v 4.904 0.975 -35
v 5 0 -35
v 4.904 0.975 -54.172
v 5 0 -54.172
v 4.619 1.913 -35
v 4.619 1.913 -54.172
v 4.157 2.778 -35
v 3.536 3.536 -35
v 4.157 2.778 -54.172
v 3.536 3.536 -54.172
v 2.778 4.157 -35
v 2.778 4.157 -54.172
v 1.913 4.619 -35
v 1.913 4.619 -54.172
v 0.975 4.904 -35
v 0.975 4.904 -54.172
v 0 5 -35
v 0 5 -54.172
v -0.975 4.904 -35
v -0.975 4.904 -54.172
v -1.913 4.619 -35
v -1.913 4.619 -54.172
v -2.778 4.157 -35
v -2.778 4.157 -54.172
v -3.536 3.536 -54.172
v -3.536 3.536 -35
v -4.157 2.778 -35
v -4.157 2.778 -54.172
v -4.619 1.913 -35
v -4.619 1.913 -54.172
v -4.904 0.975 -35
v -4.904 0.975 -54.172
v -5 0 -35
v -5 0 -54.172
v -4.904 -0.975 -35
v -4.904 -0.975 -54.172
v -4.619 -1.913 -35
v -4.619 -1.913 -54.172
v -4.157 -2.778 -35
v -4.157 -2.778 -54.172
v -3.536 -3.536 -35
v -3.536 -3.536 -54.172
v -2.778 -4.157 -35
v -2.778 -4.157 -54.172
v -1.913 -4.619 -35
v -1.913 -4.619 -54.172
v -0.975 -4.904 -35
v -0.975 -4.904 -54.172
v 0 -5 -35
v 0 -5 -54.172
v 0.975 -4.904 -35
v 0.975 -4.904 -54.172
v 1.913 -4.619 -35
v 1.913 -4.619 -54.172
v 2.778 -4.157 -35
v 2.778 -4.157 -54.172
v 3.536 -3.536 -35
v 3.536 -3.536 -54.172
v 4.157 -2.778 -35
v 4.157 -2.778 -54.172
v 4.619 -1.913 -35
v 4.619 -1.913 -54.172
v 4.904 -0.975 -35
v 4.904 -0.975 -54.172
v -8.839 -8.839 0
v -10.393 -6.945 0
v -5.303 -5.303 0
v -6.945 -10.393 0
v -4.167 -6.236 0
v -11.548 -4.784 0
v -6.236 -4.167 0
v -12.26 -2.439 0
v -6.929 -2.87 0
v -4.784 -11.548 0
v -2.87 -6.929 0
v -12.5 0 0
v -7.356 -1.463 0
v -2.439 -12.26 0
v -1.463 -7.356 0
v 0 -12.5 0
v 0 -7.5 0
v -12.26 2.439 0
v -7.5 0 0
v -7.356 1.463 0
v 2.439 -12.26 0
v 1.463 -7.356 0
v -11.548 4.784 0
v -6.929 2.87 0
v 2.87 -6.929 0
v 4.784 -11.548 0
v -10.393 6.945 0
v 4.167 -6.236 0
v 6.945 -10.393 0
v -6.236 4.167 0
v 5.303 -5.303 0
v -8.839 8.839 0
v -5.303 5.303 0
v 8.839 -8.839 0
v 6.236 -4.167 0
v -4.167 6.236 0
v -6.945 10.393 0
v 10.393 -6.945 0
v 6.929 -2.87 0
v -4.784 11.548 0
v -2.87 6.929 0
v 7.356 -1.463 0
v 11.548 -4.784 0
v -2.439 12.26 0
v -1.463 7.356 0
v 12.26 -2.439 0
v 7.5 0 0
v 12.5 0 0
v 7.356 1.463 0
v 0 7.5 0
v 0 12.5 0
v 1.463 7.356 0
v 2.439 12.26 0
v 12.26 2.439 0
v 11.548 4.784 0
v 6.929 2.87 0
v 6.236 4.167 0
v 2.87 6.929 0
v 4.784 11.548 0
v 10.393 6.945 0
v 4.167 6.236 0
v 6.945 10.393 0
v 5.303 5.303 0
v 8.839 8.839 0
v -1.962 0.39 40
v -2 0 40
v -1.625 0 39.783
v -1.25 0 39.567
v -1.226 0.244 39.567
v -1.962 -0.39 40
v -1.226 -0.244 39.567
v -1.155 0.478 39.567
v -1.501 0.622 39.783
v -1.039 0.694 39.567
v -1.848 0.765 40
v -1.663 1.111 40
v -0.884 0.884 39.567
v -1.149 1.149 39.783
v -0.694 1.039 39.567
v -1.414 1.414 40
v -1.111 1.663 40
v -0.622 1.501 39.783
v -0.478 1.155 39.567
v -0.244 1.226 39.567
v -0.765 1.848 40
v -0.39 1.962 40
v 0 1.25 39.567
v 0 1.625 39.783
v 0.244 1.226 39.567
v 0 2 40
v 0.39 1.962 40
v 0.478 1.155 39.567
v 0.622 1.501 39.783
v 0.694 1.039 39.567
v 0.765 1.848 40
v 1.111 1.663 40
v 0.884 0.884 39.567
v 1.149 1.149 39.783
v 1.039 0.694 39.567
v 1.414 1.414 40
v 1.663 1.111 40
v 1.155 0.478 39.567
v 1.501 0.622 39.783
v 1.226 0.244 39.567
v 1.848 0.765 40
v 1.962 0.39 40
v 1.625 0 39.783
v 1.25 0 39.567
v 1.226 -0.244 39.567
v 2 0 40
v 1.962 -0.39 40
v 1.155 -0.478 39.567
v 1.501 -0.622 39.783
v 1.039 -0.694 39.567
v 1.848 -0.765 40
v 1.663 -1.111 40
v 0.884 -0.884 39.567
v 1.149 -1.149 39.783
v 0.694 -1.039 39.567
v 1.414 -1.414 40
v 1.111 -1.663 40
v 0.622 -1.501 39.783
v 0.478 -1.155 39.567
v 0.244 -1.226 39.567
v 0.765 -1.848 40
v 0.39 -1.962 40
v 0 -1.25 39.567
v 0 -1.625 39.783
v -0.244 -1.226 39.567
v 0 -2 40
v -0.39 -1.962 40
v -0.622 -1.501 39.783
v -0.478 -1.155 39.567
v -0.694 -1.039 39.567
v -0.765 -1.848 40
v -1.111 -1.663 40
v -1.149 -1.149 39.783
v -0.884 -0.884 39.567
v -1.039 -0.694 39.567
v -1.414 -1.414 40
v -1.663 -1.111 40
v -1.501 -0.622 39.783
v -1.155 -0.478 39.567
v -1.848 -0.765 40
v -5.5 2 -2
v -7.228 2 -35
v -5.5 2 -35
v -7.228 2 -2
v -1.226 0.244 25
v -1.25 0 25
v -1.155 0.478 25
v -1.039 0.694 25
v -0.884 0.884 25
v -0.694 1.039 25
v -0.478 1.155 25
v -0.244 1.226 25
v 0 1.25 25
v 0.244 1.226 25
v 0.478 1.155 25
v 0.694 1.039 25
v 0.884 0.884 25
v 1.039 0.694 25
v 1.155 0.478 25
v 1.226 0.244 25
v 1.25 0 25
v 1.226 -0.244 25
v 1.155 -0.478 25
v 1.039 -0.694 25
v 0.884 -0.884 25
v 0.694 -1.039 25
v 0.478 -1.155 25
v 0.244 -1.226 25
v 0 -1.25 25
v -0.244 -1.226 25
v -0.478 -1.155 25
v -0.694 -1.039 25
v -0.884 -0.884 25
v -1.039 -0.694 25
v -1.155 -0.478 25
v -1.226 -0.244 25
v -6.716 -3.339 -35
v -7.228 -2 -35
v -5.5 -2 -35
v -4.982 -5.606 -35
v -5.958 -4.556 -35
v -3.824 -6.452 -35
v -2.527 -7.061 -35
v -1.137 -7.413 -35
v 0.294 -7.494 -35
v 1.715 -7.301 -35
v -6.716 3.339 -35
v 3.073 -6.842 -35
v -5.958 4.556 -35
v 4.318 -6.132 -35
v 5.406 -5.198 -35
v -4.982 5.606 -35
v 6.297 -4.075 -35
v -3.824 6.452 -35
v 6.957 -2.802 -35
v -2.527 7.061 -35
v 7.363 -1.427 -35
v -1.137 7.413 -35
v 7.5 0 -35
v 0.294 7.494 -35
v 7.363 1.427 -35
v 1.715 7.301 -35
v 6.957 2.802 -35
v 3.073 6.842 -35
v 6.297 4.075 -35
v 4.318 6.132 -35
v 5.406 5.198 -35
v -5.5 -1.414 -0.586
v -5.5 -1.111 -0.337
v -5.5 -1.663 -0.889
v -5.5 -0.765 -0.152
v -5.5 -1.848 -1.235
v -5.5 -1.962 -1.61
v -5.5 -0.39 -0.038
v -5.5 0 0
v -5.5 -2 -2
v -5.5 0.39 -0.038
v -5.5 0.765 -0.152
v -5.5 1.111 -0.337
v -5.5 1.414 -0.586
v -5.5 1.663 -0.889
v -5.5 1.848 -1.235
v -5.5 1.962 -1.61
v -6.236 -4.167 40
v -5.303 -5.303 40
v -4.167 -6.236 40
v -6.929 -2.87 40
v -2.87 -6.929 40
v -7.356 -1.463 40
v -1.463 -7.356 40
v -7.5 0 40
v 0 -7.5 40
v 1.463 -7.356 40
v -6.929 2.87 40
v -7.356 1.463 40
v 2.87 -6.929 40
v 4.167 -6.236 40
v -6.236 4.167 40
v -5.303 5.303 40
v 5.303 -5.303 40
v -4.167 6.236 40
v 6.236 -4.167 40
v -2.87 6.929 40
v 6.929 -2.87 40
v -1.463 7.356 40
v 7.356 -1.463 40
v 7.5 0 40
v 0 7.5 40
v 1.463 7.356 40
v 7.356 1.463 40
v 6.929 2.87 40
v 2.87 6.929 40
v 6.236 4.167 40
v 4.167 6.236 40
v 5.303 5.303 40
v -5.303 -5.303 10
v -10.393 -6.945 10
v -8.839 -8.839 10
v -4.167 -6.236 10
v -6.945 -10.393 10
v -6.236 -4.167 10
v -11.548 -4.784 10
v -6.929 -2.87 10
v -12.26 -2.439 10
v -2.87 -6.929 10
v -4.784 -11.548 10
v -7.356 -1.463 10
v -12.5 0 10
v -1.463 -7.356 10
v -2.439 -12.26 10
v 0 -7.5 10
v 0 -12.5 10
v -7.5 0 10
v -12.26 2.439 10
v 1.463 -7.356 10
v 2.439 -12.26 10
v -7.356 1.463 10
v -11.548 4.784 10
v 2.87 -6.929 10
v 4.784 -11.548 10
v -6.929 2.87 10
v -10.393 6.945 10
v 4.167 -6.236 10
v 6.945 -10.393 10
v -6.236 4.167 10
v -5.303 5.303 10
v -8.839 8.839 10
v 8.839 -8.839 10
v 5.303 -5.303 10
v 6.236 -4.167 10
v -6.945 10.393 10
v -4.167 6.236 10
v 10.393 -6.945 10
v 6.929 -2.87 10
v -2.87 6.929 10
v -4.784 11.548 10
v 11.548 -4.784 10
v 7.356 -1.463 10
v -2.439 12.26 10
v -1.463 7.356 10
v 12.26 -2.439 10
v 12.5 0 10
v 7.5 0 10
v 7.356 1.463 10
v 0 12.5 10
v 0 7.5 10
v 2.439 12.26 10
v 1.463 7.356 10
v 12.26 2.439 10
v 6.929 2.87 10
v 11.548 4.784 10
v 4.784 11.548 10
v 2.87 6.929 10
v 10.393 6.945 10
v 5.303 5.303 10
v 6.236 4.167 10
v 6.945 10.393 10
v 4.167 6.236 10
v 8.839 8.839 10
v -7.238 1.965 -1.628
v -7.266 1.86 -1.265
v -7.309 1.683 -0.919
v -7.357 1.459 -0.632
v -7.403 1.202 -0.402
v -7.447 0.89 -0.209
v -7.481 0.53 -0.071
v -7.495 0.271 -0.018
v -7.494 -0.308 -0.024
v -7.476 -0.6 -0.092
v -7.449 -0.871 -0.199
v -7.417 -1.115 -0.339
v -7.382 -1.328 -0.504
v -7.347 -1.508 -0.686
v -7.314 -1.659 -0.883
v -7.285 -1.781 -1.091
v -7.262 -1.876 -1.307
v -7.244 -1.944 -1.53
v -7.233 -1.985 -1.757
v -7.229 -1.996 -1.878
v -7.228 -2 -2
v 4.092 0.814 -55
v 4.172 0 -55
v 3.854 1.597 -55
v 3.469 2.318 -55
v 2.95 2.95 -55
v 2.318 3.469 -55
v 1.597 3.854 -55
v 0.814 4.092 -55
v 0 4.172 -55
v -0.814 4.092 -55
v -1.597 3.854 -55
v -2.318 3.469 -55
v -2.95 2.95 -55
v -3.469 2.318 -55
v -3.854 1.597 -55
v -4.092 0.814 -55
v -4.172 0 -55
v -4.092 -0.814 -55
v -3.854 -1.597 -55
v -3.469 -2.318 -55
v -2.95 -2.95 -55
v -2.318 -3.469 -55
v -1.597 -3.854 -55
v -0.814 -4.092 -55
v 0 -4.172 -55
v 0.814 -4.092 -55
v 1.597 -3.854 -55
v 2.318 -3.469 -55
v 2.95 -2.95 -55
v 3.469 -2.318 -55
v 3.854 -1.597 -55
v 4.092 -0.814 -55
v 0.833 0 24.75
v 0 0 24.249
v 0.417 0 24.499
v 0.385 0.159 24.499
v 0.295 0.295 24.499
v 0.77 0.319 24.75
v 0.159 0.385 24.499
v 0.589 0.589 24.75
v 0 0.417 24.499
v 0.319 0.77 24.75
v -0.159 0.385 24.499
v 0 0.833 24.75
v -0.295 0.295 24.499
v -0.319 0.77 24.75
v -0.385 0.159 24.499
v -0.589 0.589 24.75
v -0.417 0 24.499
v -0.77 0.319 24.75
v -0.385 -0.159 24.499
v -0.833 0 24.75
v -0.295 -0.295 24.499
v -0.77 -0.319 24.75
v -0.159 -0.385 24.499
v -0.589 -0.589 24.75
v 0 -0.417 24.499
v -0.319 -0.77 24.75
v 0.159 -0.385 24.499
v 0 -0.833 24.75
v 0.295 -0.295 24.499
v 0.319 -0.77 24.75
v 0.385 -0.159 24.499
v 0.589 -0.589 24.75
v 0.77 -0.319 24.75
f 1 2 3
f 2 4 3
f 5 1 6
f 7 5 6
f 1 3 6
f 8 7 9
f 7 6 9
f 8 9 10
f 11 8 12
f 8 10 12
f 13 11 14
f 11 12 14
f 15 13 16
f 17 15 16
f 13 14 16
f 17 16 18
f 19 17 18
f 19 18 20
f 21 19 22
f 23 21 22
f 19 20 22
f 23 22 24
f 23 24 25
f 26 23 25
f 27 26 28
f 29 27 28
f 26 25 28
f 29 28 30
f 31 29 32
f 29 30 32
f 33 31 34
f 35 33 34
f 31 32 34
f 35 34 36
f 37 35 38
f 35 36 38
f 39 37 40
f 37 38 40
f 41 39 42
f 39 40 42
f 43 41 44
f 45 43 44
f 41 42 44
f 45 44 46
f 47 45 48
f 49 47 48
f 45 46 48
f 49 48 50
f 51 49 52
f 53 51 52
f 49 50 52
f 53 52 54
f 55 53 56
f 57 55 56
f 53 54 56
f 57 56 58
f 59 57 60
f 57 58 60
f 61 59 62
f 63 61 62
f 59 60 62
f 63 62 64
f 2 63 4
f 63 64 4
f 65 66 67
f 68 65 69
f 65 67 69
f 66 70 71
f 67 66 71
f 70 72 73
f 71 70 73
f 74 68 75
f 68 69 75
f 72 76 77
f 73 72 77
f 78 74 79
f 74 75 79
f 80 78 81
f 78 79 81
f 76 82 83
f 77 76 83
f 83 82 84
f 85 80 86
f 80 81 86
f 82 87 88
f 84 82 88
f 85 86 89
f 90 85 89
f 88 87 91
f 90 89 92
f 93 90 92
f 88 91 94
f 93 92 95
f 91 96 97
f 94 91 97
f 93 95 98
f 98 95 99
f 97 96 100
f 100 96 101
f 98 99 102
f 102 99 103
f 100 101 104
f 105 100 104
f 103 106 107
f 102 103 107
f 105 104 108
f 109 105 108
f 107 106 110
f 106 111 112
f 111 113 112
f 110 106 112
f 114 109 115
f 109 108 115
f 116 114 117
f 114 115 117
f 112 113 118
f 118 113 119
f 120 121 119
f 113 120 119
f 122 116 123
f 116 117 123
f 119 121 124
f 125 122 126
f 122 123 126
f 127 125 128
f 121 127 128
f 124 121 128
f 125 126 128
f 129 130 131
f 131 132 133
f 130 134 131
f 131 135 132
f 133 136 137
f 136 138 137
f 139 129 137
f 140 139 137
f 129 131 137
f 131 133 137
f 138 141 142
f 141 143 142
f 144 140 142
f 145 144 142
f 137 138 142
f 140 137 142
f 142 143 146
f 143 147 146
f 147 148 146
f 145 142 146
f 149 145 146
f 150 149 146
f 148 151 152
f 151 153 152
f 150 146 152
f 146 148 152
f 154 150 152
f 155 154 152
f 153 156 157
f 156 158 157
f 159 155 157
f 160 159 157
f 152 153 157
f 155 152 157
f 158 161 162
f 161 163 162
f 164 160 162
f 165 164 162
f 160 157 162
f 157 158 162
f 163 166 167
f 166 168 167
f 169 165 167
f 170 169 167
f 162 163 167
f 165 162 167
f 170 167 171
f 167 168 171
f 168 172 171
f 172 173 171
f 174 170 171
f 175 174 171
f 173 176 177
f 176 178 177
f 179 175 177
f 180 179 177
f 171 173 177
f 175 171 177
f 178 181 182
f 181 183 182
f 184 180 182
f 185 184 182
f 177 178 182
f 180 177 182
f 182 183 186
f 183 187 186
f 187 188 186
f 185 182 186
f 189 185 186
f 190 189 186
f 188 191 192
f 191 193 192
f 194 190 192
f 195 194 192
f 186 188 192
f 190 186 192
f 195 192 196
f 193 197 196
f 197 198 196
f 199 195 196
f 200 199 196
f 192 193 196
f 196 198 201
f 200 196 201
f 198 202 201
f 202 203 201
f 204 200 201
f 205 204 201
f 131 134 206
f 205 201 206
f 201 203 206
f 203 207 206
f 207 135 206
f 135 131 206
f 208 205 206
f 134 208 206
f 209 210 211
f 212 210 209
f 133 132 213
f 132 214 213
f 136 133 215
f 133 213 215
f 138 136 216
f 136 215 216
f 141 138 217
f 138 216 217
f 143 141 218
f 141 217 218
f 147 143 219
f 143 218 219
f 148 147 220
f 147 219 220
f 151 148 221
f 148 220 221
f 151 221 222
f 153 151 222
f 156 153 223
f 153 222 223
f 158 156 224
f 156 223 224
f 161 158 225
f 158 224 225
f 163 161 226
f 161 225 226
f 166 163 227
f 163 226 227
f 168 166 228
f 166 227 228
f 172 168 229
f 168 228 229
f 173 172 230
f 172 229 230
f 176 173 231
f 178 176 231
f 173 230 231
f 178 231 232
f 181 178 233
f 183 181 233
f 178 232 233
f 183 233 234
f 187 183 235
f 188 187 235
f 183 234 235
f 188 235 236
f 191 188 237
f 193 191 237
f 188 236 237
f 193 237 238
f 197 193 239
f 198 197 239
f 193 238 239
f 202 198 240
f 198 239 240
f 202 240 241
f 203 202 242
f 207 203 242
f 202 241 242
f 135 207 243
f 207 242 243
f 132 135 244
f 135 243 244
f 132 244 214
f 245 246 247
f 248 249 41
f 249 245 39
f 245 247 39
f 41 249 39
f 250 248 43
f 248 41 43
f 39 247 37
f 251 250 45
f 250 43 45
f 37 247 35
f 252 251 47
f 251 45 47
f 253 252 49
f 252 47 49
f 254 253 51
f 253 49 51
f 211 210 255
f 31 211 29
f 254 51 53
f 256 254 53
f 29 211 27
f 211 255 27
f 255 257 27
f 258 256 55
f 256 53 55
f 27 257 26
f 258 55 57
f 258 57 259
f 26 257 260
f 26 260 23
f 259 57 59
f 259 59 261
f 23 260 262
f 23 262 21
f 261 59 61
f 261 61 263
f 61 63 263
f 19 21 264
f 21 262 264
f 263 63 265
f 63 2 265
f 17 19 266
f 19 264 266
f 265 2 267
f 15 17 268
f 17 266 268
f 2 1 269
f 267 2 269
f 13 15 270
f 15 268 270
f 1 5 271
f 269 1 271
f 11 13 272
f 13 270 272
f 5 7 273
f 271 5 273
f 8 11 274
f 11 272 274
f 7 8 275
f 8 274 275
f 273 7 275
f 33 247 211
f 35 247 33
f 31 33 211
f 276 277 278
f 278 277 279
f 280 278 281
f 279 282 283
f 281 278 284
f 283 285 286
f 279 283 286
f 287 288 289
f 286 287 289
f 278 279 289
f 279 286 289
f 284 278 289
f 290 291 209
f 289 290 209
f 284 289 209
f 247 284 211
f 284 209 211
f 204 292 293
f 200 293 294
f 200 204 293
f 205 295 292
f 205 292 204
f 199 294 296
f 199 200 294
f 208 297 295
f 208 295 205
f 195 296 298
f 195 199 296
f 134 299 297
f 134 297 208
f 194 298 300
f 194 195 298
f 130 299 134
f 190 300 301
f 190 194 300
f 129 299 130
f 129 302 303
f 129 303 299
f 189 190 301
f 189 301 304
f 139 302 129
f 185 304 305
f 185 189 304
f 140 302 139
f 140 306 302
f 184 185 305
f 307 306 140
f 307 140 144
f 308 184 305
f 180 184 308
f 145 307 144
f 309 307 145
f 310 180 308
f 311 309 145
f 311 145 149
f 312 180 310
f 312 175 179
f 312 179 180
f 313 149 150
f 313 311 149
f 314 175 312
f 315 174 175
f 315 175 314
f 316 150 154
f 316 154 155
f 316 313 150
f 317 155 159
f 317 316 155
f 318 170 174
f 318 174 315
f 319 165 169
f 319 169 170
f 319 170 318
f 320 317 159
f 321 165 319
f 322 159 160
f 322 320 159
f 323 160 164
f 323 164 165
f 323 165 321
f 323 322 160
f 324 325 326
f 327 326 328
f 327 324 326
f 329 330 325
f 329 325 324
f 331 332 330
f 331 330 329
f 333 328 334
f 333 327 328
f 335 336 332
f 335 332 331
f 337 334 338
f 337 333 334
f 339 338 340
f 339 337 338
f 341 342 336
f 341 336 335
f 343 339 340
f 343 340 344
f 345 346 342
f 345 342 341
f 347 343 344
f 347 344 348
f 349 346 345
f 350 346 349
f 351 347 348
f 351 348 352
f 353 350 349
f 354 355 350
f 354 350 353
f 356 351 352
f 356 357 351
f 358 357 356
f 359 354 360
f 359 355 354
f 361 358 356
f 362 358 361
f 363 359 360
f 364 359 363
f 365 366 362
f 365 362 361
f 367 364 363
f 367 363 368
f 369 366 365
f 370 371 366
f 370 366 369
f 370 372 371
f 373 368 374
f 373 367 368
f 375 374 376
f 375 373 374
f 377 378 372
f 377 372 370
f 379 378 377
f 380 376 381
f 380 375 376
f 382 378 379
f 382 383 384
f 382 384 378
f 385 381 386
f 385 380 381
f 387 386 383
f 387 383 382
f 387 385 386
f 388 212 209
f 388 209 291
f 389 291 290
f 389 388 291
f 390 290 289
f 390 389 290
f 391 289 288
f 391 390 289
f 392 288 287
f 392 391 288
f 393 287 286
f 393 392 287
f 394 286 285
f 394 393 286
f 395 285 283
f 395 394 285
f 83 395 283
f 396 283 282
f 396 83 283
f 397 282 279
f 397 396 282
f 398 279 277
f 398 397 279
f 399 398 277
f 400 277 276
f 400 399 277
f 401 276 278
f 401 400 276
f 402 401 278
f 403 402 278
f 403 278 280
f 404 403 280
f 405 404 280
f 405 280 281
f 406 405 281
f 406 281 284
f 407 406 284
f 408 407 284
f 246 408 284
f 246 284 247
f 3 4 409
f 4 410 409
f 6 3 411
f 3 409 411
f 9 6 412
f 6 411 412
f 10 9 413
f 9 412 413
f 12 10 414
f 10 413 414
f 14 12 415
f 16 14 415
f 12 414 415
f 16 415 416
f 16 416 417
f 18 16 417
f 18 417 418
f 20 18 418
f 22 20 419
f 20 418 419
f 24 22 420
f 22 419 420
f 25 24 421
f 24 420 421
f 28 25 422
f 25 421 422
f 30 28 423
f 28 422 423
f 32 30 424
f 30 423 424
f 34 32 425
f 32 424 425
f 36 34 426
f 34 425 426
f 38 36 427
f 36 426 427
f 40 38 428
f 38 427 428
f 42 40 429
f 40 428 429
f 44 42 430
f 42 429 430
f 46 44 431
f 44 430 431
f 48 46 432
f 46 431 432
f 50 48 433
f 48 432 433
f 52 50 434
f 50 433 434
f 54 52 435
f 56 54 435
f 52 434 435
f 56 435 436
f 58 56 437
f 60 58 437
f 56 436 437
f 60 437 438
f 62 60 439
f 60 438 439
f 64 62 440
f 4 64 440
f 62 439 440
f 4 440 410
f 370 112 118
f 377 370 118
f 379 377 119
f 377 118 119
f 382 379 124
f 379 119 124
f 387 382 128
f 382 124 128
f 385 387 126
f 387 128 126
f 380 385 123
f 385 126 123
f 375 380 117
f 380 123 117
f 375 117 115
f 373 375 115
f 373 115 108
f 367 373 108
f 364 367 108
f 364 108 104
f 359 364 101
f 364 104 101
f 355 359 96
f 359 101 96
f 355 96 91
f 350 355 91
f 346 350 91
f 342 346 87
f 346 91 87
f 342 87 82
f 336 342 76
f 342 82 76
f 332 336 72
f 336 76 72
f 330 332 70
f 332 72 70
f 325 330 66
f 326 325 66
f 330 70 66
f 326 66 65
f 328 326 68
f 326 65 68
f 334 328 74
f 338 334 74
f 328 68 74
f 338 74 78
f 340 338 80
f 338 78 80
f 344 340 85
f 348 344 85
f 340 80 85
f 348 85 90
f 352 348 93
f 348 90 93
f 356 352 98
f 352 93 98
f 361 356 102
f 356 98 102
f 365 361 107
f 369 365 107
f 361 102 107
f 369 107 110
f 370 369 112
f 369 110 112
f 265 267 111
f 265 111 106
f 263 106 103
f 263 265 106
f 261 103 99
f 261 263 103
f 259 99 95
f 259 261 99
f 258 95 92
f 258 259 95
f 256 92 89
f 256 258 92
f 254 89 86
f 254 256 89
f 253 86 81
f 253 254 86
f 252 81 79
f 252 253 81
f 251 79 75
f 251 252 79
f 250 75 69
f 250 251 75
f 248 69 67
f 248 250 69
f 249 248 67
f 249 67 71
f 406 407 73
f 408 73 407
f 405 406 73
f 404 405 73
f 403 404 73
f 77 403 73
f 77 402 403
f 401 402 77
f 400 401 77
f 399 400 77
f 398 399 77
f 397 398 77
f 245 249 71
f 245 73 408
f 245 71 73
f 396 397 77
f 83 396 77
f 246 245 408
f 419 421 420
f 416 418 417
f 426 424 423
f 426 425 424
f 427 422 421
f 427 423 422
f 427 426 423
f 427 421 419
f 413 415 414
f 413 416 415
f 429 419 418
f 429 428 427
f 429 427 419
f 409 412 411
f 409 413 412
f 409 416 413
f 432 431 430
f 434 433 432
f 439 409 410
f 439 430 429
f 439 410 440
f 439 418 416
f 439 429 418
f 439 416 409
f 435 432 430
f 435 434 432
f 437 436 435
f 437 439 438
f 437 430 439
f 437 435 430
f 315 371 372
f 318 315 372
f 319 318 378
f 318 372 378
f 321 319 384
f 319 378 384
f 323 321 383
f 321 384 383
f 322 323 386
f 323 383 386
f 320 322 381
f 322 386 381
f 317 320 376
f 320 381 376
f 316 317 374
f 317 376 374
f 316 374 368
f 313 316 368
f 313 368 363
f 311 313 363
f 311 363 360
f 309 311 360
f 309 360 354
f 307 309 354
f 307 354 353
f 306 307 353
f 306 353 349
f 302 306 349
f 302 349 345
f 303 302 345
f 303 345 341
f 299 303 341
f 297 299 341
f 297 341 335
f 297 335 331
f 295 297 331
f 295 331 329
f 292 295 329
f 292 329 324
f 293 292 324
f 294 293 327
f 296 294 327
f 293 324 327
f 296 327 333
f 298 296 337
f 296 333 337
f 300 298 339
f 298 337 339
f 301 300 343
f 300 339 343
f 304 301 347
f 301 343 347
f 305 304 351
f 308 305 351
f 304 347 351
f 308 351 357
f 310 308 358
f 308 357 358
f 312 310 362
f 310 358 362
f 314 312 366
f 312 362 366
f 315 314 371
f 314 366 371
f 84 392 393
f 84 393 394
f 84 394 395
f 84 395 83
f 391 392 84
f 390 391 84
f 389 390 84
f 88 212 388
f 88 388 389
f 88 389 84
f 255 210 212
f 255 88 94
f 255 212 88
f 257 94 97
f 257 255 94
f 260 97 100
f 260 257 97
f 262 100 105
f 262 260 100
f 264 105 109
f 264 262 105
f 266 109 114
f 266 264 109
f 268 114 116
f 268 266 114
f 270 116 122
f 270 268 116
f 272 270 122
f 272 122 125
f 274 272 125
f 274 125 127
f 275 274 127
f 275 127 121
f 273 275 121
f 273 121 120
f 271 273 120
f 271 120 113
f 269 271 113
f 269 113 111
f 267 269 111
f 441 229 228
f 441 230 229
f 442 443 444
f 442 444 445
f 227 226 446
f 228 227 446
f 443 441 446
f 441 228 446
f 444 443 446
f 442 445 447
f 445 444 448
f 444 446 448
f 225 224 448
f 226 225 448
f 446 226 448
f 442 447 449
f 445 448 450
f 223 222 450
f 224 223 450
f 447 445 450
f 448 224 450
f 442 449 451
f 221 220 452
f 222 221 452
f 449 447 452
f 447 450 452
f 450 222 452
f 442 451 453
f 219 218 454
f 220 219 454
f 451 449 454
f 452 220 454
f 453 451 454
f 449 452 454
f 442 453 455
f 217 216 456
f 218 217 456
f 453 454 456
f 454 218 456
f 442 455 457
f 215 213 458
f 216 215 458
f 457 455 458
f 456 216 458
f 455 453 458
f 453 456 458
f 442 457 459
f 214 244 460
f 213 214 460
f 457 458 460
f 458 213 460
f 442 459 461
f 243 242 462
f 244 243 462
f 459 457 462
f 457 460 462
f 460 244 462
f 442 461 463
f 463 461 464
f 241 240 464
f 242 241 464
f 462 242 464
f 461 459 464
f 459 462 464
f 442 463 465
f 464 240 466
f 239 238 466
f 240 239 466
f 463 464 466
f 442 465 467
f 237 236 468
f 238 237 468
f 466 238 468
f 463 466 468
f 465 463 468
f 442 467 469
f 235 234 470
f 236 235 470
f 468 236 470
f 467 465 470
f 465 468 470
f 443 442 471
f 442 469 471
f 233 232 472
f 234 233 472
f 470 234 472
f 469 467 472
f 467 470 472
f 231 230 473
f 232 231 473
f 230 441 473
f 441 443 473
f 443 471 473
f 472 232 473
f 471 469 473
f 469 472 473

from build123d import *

# Parameters (mm, degrees)
SKETCH1_R                       = 12.5
F_25MM_DIA_DEPTH                = 10
F_15MM_START                    = -10
SKETCH2_R                       = 7.5
F_15MM_DIA_BEARING_END_DEPTH    = 40
F_15MM_START_2                  = 55
SKETCH3_R                       = 7.5
F_15MM_DIA_GEAR_END_DEPTH       = 55
M3X0_5_TAPPED_HOLE1_D           = 2.5
M3X0_5_TAPPED_HOLE1_DEPTH       = 15
M3X0_5_TAPPED_HOLE1_CSINK_D     = 4
M3X0_5_TAPPED_HOLE1_CSINK_ANGLE = 120
M3X0_5_TAPPED_HOLE1_TIP         = 0.751075774
CUT_EXTRUDE1_DEPTH              = 2


# Read off the part's stored shape, not the designer's step: M10x1.5 Machine Threads Stud1
with BuildPart() as part:
    # Sketch1 → 25mm dia (new body)
    with BuildSketch(Plane.XY):
        Circle(SKETCH1_R)
    extrude(amount=F_25MM_DIA_DEPTH)

    # Sketch2 → 15mm dia bearing end (add)
    with BuildSketch(Plane.XY.offset(10).offset(F_15MM_START)):
        Circle(SKETCH2_R)
    extrude(amount=F_15MM_DIA_BEARING_END_DEPTH)

    # Sketch3 → 15mm dia gear end (add)
    with BuildSketch(Plane(origin=(0, 0, 0), x_dir=(-1, 0, 0), z_dir=(0, 0, -1)).offset(F_15MM_START_2)):
        with Locations(Location((0, 0, 0), (0, 0, 180))):
            Circle(SKETCH3_R)
    extrude(amount=-F_15MM_DIA_GEAR_END_DEPTH)

    # M3x0.5 Tapped Hole1
    with Locations(Plane.XY.offset(40)):
        with Locations((0, 0)):
            CounterSinkHole(M3X0_5_TAPPED_HOLE1_D / 2, M3X0_5_TAPPED_HOLE1_CSINK_D / 2, depth=M3X0_5_TAPPED_HOLE1_DEPTH, counter_sink_angle=M3X0_5_TAPPED_HOLE1_CSINK_ANGLE)
            with Locations((0, 0, -(M3X0_5_TAPPED_HOLE1_DEPTH + M3X0_5_TAPPED_HOLE1_TIP / 2))):  # 118° drill point
                Cone(0, M3X0_5_TAPPED_HOLE1_D / 2, M3X0_5_TAPPED_HOLE1_TIP, mode=Mode.SUBTRACT)

    # M10x1.5 Machine Threads Stud1 outline → M10x1.5 Machine Threads Stud1 (revolve, cut)
    with BuildSketch(Plane.XZ):
        Polygon((4.172, -55), (7.5, -55), (7.5, -35), (5, -35), (5, -54.172), align=None)
    revolve(axis=Axis((0, 0, 0), (0, 0, 1)), mode=Mode.SUBTRACT)

    # Sketch15 → Cut-Extrude1 (cut)
    with BuildSketch(Plane.ZY.offset(7.5)):
        with BuildLine():
            Line((-35, 2), (-2, 2))
            ThreePointArc((-2, 2), (0, 0), (-2, -2))
            Line((-2, -2), (-35, -2))
            Line((-35, -2), (-35, 2))
        make_face()
    extrude(amount=-CUT_EXTRUDE1_DEPTH, mode=Mode.SUBTRACT)


solid = part.part
